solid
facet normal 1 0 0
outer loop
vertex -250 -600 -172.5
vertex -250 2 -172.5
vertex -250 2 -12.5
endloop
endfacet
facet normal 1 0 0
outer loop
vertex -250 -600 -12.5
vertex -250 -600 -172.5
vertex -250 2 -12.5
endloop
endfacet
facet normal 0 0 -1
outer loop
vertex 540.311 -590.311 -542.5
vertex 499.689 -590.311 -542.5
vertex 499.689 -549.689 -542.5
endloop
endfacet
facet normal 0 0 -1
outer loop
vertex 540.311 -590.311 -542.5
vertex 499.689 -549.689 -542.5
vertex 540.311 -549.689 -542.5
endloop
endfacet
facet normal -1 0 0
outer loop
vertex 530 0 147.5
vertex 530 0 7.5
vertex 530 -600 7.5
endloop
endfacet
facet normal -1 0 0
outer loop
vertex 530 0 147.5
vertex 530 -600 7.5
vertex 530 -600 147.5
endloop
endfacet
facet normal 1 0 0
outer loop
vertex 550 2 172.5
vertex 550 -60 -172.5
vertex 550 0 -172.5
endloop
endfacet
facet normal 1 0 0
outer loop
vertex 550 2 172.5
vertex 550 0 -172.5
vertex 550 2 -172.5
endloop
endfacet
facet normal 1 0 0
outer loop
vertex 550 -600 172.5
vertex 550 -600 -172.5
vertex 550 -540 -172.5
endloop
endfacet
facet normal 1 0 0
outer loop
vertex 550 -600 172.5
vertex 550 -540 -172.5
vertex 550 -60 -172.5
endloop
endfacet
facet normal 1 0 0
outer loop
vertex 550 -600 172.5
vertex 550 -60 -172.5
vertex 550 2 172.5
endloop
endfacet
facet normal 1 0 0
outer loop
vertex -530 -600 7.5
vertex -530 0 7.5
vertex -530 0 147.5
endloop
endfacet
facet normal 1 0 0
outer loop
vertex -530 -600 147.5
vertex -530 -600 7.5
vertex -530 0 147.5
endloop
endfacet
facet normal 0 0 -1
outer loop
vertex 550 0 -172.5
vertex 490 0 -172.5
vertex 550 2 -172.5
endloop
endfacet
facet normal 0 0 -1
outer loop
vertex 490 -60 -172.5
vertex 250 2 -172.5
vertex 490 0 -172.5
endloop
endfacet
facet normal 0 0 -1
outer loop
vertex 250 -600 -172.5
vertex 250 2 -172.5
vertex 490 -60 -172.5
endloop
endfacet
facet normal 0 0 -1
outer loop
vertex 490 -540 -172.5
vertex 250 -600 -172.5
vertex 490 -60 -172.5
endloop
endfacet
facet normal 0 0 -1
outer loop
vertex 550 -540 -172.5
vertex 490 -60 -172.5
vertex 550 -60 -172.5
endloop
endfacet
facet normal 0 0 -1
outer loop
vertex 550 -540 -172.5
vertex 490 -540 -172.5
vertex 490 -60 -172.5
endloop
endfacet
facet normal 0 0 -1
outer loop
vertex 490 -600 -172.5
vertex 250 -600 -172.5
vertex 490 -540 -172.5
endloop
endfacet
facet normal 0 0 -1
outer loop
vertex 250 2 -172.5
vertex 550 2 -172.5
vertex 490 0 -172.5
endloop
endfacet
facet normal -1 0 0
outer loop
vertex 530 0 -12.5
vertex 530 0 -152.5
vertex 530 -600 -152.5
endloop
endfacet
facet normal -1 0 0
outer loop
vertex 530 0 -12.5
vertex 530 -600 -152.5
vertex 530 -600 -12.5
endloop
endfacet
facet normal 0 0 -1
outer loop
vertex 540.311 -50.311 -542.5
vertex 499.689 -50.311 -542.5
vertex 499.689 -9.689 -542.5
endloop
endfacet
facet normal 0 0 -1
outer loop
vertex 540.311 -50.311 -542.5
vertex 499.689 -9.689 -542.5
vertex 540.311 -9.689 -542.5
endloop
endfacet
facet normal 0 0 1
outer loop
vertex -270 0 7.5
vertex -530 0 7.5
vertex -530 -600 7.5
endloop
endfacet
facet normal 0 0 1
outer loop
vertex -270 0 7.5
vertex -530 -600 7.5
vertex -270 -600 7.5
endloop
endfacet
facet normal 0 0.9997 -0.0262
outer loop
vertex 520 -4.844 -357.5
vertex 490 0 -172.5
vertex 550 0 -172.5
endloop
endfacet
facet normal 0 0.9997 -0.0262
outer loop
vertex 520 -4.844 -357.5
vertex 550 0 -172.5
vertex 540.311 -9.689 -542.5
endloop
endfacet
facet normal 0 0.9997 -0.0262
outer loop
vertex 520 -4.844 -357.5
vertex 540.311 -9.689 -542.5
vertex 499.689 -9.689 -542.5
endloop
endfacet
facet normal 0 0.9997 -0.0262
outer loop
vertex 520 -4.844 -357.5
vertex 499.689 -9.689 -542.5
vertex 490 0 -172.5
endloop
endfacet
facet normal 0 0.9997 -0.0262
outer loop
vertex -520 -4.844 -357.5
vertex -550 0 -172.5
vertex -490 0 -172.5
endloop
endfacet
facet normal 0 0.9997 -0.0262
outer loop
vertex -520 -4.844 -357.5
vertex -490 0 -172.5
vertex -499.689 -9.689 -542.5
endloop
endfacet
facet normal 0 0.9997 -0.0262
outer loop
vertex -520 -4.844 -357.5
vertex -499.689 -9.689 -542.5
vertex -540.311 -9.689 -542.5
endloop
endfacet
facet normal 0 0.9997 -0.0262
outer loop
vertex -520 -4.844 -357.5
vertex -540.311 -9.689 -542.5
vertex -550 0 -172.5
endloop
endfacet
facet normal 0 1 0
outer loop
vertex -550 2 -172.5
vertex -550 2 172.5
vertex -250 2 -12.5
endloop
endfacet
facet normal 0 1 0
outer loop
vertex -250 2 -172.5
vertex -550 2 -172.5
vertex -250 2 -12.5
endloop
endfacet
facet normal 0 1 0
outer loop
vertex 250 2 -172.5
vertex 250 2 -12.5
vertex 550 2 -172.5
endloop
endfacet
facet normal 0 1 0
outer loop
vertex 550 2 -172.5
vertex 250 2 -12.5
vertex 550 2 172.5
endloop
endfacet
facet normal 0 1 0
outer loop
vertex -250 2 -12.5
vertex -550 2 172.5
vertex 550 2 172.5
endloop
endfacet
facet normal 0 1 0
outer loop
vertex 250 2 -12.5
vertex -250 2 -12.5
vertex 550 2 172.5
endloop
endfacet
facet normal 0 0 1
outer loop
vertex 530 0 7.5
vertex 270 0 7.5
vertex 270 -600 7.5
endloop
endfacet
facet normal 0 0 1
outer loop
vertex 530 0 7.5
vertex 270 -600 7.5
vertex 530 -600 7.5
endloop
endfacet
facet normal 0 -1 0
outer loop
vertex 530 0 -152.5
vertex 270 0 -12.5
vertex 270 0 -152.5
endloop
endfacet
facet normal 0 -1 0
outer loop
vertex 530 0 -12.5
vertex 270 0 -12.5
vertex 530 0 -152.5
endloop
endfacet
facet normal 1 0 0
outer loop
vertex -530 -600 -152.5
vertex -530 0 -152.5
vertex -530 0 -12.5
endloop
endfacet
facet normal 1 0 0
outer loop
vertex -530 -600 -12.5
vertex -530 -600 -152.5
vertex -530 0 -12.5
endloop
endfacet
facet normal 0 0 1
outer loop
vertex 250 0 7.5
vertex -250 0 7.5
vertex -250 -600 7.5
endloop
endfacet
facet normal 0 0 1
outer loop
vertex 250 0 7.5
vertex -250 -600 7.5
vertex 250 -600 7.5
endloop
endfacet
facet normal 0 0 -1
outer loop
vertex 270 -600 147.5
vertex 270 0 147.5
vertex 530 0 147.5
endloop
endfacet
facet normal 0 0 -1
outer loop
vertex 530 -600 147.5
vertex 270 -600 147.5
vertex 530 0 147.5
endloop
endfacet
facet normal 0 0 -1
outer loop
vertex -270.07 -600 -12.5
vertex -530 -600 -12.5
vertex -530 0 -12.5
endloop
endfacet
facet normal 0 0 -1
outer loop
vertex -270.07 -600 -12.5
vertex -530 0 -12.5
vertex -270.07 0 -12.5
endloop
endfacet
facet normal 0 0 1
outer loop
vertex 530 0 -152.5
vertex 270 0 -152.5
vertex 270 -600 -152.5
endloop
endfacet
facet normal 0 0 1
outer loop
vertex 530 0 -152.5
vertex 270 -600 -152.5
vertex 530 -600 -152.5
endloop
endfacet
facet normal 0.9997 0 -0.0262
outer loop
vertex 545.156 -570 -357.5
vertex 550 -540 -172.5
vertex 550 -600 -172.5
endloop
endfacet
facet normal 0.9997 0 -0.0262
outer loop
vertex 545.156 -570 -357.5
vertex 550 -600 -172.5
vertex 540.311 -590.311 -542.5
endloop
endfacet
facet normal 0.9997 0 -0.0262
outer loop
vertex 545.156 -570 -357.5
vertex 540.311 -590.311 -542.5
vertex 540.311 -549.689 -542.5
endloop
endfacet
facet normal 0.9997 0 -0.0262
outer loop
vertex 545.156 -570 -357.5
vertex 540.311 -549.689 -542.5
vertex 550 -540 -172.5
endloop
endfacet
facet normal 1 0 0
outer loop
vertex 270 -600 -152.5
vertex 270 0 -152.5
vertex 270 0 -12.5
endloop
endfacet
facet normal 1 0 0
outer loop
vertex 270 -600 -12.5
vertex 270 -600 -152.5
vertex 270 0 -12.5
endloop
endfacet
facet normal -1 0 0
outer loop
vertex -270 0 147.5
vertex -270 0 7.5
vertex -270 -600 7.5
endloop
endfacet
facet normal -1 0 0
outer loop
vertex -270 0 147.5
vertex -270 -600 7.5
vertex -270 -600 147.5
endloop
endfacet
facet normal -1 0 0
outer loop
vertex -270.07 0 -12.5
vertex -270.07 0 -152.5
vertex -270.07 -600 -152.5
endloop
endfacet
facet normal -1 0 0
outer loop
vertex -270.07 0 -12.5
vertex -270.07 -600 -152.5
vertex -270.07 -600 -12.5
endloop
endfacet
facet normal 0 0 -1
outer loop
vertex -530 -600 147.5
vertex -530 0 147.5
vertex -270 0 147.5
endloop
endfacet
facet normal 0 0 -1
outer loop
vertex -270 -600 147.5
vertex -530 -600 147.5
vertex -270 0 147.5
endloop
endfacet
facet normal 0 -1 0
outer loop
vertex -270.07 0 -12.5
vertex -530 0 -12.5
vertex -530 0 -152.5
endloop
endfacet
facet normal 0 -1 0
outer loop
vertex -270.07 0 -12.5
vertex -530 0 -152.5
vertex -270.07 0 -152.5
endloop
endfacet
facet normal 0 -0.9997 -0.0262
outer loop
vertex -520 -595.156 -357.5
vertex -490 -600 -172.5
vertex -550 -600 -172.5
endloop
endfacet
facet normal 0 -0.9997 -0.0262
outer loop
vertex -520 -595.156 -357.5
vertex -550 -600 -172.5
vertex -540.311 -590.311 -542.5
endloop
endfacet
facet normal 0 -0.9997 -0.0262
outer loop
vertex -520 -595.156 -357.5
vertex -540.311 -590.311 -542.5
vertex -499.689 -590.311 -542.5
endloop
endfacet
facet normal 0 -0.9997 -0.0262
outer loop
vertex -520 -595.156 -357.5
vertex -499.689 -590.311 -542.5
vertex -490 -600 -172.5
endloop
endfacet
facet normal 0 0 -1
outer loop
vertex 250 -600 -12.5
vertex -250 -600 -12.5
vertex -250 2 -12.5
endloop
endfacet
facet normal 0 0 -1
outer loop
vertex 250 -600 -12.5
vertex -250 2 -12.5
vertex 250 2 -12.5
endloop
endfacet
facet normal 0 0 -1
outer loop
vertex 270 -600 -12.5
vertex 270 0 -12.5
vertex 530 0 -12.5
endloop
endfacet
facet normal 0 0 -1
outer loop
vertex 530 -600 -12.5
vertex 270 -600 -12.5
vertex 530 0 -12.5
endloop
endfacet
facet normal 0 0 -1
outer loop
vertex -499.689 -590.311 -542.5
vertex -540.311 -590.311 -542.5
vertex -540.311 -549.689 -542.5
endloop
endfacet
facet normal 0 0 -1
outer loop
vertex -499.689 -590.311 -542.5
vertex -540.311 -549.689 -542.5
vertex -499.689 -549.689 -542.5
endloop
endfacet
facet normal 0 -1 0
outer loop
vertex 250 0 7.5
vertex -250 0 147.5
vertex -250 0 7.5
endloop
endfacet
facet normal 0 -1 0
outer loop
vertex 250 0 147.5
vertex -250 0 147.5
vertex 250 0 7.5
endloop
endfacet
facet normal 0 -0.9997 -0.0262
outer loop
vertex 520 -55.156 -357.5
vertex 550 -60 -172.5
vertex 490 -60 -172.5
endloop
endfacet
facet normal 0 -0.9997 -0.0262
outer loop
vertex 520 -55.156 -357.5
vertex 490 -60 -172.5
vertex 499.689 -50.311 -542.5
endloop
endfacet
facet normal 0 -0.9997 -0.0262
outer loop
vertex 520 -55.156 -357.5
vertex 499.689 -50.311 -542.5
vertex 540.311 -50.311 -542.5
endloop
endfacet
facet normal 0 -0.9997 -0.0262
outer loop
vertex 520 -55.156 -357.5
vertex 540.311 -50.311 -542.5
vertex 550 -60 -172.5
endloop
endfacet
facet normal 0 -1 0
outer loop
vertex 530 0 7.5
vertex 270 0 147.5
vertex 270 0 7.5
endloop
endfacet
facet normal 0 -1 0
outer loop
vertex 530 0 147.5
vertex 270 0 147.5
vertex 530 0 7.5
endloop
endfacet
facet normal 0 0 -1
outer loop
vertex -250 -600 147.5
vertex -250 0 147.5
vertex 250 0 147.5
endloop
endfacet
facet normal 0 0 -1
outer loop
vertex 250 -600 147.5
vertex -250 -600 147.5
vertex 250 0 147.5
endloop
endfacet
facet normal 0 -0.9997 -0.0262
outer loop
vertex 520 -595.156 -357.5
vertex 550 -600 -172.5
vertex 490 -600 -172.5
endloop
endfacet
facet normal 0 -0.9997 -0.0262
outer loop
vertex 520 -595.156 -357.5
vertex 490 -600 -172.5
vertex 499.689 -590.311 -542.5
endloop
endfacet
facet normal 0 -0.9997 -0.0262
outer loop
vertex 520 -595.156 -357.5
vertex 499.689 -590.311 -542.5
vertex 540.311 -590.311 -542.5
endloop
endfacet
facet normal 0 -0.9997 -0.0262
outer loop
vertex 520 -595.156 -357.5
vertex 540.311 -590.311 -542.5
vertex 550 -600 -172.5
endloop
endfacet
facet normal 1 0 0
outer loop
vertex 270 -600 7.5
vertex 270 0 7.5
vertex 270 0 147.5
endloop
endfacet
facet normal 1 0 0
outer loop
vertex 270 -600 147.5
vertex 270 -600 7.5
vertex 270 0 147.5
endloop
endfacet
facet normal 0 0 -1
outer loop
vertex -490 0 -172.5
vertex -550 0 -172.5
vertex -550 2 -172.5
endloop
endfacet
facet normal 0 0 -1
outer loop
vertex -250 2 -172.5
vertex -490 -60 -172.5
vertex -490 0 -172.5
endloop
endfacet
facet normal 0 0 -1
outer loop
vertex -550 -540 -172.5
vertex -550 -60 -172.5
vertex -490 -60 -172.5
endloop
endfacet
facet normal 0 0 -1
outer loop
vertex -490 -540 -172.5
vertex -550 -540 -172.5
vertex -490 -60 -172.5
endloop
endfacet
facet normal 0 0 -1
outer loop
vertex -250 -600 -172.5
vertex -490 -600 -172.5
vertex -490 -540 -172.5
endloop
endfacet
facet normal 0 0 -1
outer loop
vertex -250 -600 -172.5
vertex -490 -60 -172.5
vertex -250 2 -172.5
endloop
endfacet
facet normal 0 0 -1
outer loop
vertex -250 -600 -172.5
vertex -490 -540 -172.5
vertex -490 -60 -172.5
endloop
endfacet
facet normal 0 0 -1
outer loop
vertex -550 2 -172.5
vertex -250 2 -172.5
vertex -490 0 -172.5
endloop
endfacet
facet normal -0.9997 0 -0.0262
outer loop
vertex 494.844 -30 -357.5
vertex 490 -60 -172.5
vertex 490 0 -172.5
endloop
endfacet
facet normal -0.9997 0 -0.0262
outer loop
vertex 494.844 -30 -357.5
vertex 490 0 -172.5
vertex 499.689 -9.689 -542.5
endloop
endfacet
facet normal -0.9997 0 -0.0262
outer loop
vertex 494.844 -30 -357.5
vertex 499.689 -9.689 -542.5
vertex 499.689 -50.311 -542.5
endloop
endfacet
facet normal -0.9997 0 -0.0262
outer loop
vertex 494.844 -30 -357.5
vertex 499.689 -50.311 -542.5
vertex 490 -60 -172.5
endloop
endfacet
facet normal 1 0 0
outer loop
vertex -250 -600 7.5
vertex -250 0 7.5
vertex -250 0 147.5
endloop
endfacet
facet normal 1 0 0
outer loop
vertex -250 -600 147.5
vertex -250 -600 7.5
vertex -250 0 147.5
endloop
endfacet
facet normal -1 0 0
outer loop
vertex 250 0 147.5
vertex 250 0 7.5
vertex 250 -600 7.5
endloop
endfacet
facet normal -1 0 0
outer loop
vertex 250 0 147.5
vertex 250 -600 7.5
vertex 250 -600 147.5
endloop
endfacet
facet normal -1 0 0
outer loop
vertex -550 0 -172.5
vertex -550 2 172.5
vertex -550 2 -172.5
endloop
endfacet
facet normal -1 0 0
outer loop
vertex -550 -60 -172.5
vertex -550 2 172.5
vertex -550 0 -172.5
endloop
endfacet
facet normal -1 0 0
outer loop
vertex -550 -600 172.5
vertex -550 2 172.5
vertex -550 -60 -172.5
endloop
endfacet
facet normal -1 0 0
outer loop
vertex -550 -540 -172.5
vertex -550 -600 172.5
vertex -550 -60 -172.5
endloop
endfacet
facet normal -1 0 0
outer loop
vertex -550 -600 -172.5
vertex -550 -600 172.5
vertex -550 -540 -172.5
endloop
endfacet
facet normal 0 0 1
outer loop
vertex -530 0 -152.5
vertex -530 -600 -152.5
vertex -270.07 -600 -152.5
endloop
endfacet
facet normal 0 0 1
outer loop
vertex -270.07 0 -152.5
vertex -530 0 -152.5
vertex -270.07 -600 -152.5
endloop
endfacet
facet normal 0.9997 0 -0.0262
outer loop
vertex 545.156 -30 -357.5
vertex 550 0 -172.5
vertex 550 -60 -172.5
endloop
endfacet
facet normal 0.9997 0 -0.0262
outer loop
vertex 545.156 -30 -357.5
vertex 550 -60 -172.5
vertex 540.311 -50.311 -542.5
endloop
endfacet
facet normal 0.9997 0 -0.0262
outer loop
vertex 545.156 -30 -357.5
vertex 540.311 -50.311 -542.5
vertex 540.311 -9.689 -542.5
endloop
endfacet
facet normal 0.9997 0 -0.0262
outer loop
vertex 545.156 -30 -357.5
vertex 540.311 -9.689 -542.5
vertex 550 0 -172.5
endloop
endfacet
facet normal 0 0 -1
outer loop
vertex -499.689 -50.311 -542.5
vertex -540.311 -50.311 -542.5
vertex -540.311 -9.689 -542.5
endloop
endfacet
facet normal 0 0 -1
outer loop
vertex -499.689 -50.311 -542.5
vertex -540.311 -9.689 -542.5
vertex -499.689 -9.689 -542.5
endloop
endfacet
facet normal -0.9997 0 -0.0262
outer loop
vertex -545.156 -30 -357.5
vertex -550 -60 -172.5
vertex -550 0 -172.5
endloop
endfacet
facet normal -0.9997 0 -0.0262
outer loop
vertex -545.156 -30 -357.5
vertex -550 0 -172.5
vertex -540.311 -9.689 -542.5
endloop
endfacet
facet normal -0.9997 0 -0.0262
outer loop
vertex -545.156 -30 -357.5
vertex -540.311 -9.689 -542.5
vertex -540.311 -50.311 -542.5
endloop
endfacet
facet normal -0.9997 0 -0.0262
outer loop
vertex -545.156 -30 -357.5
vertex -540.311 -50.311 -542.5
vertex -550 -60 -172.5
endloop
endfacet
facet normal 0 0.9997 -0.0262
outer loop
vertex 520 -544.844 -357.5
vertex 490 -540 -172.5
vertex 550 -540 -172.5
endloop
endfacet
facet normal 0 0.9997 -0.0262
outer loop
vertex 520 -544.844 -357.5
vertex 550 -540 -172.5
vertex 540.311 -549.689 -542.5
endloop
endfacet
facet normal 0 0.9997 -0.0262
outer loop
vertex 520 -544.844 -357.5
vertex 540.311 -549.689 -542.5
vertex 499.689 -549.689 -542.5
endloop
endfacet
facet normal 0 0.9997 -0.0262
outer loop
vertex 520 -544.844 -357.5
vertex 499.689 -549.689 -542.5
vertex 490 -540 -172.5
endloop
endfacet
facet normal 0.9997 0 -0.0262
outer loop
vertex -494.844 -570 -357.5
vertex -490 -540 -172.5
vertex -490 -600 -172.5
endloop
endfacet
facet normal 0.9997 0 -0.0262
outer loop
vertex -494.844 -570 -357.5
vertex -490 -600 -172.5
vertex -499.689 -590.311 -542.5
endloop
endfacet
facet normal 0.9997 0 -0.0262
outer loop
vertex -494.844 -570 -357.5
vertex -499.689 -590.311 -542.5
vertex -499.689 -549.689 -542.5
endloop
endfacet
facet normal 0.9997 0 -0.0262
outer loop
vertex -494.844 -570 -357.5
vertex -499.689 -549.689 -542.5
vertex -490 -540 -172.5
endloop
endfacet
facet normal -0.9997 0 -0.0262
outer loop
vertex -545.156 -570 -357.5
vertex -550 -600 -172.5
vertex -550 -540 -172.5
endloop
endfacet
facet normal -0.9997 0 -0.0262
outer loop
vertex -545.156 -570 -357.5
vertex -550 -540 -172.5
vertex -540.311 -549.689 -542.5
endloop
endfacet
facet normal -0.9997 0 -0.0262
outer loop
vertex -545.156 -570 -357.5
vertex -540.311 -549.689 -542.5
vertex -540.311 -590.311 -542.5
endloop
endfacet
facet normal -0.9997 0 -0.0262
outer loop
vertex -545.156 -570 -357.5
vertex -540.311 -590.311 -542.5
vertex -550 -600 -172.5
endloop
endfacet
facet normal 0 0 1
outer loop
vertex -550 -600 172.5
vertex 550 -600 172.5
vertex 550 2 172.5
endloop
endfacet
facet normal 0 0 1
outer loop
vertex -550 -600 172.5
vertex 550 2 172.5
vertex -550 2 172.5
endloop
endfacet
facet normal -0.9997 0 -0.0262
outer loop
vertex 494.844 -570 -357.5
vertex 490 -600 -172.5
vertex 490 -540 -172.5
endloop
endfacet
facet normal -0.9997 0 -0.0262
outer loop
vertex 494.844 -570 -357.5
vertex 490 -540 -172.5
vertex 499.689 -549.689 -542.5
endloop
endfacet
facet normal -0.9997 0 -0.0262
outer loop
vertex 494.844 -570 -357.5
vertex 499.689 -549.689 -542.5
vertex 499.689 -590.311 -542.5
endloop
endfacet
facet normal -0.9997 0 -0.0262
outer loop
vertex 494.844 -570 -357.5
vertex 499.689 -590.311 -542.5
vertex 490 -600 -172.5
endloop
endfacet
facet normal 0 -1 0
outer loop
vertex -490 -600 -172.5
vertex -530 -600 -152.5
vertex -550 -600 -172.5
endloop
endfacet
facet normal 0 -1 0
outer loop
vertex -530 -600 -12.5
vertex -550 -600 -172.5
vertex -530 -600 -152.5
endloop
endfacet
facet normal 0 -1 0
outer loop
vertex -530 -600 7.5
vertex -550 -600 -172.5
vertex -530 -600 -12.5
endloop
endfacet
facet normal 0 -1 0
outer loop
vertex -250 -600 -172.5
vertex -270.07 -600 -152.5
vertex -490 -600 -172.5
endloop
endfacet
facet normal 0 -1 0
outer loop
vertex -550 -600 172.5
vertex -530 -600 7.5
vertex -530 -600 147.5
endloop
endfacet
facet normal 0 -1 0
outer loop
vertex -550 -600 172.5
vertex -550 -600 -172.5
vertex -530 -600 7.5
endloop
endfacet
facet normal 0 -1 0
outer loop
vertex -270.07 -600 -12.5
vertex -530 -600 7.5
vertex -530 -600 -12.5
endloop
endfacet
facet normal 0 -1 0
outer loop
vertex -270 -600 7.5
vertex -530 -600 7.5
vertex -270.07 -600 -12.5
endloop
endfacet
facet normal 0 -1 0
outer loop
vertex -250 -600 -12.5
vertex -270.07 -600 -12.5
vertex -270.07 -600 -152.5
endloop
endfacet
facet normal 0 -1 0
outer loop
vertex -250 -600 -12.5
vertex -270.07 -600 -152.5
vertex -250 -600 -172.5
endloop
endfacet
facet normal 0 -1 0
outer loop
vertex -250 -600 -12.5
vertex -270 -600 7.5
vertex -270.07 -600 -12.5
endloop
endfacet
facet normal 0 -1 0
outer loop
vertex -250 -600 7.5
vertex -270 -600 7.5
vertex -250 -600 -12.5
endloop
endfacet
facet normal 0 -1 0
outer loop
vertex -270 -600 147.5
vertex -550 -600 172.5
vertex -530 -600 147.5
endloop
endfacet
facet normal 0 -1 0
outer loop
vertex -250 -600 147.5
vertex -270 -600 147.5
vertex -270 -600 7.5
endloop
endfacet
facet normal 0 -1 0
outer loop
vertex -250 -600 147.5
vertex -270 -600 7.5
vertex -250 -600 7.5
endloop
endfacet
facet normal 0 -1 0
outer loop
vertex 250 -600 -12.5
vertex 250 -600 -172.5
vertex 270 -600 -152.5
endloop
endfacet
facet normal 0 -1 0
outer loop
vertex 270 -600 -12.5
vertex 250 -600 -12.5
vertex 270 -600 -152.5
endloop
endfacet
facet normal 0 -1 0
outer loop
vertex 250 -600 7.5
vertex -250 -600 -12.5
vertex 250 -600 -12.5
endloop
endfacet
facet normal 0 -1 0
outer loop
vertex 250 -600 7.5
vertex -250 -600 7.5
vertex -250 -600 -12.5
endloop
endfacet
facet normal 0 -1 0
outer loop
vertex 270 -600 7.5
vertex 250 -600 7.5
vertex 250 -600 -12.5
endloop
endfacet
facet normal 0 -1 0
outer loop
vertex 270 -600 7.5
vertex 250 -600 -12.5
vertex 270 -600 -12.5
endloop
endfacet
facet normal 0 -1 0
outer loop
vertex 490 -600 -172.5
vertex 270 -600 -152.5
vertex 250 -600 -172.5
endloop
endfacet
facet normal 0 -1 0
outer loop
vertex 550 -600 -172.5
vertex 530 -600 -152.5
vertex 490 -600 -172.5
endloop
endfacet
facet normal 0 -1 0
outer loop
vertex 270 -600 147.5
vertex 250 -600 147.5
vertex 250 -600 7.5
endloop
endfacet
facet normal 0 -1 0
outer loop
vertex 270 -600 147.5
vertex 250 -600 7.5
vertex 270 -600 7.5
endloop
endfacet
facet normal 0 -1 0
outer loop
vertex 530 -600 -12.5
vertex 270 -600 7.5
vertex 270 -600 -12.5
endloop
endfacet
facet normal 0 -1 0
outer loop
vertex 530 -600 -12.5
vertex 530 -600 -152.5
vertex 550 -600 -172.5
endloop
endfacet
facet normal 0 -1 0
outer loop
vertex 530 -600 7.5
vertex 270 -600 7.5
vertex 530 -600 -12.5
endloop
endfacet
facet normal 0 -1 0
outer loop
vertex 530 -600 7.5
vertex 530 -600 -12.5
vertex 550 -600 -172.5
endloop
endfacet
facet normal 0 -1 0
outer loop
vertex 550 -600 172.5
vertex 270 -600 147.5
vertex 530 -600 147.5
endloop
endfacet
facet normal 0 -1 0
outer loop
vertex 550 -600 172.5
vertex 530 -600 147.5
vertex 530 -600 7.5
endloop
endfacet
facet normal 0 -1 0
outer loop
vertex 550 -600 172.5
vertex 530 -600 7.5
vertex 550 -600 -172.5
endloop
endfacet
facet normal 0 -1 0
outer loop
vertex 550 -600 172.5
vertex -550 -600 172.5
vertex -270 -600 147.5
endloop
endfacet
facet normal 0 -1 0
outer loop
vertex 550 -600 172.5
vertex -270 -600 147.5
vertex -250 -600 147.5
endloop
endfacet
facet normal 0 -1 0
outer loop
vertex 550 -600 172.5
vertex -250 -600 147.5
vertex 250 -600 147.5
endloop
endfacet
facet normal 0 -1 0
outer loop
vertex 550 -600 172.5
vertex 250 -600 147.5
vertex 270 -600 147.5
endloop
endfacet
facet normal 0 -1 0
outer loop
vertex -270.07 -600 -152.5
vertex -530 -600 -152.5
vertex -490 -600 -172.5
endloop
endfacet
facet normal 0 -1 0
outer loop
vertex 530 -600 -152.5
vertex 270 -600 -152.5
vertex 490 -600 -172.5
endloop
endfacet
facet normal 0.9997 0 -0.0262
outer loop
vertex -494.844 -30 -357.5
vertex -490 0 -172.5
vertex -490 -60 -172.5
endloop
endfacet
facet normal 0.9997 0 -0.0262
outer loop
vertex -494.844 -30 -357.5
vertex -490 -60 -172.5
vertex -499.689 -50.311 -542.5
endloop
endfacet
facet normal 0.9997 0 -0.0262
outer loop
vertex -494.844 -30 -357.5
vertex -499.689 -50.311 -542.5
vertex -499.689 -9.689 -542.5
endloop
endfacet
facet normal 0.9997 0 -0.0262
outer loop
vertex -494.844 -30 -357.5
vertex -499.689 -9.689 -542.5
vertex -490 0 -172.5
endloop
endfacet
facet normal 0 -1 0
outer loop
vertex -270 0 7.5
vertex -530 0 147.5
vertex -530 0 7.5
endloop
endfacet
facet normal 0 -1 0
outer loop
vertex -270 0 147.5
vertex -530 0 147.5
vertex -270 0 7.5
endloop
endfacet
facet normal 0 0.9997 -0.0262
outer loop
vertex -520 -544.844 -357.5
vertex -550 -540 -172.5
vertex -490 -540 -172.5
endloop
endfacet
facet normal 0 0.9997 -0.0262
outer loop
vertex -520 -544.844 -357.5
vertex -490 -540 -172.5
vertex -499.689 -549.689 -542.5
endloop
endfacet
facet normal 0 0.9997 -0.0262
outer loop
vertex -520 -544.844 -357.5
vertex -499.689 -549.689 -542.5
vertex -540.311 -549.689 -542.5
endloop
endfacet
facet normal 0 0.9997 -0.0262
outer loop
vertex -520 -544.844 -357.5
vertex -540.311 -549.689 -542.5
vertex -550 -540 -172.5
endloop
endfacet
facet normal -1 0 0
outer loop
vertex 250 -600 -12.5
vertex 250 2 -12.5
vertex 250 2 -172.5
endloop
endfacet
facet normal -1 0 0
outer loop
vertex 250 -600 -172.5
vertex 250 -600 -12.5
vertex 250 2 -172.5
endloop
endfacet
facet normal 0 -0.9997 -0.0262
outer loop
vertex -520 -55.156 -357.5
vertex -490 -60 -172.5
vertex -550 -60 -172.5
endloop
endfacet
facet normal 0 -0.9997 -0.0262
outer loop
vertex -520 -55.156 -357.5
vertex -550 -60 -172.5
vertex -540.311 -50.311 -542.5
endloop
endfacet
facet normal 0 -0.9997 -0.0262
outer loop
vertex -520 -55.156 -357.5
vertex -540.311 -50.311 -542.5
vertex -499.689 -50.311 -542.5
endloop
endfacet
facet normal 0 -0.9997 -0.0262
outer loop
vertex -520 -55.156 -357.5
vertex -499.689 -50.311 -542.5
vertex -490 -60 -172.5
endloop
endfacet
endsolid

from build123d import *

# Parameters (mm, degrees)
F0_W     = 259.929892
F0_H     = 140
F0_W_2   = 260
F0_W_3   = 500
F2_DEPTH = 600
F3_DEPTH = 2
F4_W     = 60
F4_H     = 60
F5_W     = 60
F5_H     = 60
F6_DEPTH = 370
F6_TAPER = 1.5


with BuildPart() as f2:
    # F0 (on Front) → F2 (new body)
    with BuildSketch(Plane.XZ):
        Polygon((550, 172.5), (-550, 172.5), (-550, -172.5), (-500.11901, -172.5), (-250, -172.5), (-250, -12.5), (250, -12.5), (250, -172.5), (490, -172.5), (550, -172.5), align=None)
        with Locations((-400.035054, -82.5)):
            Rectangle(F0_W, F0_H, mode=Mode.SUBTRACT)
        with Locations((400, -82.5)):
            Rectangle(F0_W_2, F0_H, mode=Mode.SUBTRACT)
        with Locations((-400, 77.5)):
            Rectangle(F0_W_2, F0_H, mode=Mode.SUBTRACT)
        with Locations((0, 77.5)):
            Rectangle(F0_W_3, F0_H, mode=Mode.SUBTRACT)
        with Locations((400, 77.5)):
            Rectangle(F0_W_2, F0_H, mode=Mode.SUBTRACT)
    extrude(amount=F2_DEPTH)

    # F1 (on Front) → F3 (join)
    with BuildSketch(Plane.XZ):
        Polygon((550, -172.5), (550, 172.5), (-550, 172.5), (-550, -172.5), (-250, -172.5), (-250, -12.5), (250, -12.5), (250, -172.5), align=None)
    extrude(amount=-F3_DEPTH)

    # F4 (on face) + F5 (on face) → F6 (join)
    with BuildSketch(Plane(origin=(0, 0, -172.5), x_dir=(1, 0, 0), z_dir=(0, 0, -1))):
        with Locations((-520, 570)):
            Rectangle(F4_W, F4_H)
        with Locations((-520, 30)):
            Rectangle(F4_W, F4_H)
    with BuildSketch(Plane(origin=(0, 0, -172.5), x_dir=(1, 0, 0), z_dir=(0, 0, -1))):
        with Locations((520, 570)):
            Rectangle(F5_W, F5_H)
        with Locations((520, 30)):
            Rectangle(F5_W, F5_H)
    extrude(amount=F6_DEPTH, taper=F6_TAPER)


solid = f2.part
